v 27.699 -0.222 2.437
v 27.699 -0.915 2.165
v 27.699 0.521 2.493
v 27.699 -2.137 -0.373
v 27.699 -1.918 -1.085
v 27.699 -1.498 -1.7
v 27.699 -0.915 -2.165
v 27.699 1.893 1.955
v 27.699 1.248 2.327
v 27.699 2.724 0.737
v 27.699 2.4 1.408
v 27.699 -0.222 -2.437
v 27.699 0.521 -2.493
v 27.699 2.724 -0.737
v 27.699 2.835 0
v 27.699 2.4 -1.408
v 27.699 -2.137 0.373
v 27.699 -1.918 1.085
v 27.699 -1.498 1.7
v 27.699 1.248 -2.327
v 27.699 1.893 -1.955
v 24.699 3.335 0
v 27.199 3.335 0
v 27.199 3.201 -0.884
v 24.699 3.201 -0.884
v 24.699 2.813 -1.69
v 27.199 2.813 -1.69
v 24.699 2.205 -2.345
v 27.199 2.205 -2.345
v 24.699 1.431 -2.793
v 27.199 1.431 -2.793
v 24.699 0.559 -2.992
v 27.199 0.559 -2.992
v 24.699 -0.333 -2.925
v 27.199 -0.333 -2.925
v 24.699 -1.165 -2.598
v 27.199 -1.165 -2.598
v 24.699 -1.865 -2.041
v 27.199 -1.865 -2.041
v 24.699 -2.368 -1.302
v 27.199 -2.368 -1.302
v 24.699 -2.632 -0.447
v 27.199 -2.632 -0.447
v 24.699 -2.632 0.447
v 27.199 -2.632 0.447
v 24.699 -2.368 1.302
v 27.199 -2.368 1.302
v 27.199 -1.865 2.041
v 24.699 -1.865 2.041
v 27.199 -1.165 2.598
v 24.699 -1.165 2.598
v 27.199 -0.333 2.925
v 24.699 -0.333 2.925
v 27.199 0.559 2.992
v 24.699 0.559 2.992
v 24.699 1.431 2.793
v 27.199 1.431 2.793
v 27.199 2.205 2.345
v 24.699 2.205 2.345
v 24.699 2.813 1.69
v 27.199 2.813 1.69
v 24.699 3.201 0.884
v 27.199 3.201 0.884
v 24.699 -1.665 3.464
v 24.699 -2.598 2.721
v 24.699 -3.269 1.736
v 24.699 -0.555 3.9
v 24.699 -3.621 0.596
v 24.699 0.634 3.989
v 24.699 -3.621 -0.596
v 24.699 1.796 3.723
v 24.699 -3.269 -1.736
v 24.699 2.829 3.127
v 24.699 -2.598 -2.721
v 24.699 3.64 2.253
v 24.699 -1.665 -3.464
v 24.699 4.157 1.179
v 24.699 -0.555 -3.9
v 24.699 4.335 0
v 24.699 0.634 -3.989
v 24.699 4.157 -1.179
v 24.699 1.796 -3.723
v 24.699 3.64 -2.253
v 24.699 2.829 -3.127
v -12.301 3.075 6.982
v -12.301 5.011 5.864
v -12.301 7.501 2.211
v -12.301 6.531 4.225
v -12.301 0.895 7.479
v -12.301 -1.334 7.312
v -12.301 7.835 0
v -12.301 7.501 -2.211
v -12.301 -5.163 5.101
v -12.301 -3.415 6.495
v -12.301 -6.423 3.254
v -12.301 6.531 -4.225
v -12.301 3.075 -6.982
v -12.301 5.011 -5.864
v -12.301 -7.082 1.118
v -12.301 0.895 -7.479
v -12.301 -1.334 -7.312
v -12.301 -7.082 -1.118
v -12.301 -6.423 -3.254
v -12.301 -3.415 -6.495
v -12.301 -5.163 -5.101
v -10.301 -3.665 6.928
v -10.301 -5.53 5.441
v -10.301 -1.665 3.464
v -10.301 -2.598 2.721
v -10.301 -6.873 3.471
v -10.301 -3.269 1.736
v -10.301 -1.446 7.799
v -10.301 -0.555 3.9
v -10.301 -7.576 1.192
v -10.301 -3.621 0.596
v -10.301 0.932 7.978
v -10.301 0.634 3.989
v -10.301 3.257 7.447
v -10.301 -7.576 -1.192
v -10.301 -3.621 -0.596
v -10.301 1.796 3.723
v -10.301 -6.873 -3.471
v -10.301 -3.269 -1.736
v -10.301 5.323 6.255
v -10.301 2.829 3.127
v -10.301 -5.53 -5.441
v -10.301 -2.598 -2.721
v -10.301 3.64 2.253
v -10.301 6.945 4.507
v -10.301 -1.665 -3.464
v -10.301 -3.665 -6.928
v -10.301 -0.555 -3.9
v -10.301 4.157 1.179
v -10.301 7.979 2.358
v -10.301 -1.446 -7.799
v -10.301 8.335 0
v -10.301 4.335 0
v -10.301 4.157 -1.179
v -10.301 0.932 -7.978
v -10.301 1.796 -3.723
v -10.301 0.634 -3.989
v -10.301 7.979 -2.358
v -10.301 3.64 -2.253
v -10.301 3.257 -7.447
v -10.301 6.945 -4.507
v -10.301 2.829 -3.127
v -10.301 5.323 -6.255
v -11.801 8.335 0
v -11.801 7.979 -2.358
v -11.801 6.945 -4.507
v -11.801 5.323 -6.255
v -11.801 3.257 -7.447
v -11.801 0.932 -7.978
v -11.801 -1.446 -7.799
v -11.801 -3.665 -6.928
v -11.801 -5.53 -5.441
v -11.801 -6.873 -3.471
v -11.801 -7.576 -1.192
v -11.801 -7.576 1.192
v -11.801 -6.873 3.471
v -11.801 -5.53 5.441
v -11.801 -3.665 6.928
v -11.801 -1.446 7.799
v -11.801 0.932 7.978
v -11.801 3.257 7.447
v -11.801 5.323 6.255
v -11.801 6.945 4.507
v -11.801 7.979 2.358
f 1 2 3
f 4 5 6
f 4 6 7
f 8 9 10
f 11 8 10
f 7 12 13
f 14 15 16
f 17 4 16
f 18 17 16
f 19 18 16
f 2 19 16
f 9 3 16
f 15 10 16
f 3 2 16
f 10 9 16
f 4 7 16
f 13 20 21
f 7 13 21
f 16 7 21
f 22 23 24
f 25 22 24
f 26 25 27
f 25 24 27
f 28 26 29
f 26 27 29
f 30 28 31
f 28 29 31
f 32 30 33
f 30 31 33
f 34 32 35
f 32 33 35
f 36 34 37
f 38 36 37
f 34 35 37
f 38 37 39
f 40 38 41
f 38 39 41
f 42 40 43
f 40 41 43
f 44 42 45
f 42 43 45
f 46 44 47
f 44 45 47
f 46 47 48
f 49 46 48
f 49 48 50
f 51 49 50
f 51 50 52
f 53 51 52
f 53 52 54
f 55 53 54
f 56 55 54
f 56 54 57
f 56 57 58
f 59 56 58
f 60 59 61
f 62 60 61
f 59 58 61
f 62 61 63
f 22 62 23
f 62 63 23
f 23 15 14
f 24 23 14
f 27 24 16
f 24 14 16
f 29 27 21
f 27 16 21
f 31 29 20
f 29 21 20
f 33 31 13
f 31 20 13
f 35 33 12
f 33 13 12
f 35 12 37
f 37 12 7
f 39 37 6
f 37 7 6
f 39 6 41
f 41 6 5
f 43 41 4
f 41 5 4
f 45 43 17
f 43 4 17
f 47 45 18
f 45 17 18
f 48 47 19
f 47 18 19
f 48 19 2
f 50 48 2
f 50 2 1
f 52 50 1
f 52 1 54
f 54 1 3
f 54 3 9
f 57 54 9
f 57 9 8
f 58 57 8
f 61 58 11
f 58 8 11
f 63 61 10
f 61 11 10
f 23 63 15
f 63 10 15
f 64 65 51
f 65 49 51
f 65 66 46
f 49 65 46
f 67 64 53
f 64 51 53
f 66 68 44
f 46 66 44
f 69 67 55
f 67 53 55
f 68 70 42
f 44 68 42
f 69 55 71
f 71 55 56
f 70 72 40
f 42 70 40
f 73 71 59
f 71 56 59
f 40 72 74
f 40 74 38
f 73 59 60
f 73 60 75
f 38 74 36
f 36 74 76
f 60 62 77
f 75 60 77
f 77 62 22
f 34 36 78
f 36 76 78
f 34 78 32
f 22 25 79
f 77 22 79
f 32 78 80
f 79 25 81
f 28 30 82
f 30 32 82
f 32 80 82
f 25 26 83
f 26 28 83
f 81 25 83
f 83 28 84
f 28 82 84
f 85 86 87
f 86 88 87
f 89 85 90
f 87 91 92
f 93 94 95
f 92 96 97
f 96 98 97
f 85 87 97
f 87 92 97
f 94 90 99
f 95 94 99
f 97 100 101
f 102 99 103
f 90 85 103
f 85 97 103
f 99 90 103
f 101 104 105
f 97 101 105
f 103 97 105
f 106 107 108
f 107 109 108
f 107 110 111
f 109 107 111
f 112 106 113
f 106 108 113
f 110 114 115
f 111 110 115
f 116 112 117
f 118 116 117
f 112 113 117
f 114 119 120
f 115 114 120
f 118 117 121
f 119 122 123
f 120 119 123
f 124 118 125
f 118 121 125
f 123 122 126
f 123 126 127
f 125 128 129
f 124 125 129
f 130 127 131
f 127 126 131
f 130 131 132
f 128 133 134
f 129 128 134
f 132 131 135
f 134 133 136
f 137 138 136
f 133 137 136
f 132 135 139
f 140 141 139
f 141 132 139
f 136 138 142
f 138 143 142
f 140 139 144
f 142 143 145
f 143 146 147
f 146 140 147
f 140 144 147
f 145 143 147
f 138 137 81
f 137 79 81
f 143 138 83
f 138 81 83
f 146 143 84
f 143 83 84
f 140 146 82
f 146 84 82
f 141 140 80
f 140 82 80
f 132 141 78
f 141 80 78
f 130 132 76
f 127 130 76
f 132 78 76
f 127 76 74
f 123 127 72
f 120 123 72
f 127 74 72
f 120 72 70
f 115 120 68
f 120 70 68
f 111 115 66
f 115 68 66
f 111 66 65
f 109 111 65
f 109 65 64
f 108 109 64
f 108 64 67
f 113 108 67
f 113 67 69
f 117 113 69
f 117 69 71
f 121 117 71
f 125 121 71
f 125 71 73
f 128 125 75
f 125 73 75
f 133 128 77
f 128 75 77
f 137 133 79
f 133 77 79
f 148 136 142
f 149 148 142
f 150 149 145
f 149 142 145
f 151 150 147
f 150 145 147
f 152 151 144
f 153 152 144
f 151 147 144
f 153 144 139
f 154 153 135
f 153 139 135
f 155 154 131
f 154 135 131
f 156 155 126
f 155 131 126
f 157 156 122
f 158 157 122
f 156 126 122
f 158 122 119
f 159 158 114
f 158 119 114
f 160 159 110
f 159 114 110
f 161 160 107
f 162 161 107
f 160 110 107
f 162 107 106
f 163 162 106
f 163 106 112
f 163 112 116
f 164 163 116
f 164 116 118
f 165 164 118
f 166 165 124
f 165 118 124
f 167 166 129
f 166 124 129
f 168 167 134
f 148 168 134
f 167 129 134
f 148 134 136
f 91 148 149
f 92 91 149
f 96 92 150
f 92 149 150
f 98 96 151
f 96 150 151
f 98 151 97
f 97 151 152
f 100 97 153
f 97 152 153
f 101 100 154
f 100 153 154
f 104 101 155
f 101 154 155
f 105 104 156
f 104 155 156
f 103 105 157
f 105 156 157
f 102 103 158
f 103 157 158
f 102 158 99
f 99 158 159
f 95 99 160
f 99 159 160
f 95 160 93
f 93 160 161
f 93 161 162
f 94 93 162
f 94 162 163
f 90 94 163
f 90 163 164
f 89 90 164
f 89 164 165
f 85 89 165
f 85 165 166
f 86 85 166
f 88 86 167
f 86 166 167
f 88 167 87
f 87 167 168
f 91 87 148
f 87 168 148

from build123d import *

# Parameters (mm, degrees)
CHAMFER_1_SIZE = 0.5


with BuildPart() as part:
    # 草图1 → 旋转1 (revolve)
    with BuildSketch(Plane.XY):
        Polygon((-12.301369863, 0.334637965), (-12.301369863, 8.334637965), (-10.301369863, 8.334637965), (-10.301369863, 4.334637965), (24.698630137, 4.334637965), (24.698630137, 3.334637965), (27.698630137, 3.334637965), (27.698630137, 0.334637965), align=None)
    revolve(axis=Axis((27.698630137, 0.334637965, 0), (-1, 0, 0)))

    # 倒角1
    chamfer_1_edges = [part.edges().sort_by_distance(p)[0] for p in [
        (27.698630137, -2.665362035, 0),
        (-12.301369863, -7.665362035, 0),
    ]]
    chamfer(chamfer_1_edges, length=CHAMFER_1_SIZE)


solid = part.part
